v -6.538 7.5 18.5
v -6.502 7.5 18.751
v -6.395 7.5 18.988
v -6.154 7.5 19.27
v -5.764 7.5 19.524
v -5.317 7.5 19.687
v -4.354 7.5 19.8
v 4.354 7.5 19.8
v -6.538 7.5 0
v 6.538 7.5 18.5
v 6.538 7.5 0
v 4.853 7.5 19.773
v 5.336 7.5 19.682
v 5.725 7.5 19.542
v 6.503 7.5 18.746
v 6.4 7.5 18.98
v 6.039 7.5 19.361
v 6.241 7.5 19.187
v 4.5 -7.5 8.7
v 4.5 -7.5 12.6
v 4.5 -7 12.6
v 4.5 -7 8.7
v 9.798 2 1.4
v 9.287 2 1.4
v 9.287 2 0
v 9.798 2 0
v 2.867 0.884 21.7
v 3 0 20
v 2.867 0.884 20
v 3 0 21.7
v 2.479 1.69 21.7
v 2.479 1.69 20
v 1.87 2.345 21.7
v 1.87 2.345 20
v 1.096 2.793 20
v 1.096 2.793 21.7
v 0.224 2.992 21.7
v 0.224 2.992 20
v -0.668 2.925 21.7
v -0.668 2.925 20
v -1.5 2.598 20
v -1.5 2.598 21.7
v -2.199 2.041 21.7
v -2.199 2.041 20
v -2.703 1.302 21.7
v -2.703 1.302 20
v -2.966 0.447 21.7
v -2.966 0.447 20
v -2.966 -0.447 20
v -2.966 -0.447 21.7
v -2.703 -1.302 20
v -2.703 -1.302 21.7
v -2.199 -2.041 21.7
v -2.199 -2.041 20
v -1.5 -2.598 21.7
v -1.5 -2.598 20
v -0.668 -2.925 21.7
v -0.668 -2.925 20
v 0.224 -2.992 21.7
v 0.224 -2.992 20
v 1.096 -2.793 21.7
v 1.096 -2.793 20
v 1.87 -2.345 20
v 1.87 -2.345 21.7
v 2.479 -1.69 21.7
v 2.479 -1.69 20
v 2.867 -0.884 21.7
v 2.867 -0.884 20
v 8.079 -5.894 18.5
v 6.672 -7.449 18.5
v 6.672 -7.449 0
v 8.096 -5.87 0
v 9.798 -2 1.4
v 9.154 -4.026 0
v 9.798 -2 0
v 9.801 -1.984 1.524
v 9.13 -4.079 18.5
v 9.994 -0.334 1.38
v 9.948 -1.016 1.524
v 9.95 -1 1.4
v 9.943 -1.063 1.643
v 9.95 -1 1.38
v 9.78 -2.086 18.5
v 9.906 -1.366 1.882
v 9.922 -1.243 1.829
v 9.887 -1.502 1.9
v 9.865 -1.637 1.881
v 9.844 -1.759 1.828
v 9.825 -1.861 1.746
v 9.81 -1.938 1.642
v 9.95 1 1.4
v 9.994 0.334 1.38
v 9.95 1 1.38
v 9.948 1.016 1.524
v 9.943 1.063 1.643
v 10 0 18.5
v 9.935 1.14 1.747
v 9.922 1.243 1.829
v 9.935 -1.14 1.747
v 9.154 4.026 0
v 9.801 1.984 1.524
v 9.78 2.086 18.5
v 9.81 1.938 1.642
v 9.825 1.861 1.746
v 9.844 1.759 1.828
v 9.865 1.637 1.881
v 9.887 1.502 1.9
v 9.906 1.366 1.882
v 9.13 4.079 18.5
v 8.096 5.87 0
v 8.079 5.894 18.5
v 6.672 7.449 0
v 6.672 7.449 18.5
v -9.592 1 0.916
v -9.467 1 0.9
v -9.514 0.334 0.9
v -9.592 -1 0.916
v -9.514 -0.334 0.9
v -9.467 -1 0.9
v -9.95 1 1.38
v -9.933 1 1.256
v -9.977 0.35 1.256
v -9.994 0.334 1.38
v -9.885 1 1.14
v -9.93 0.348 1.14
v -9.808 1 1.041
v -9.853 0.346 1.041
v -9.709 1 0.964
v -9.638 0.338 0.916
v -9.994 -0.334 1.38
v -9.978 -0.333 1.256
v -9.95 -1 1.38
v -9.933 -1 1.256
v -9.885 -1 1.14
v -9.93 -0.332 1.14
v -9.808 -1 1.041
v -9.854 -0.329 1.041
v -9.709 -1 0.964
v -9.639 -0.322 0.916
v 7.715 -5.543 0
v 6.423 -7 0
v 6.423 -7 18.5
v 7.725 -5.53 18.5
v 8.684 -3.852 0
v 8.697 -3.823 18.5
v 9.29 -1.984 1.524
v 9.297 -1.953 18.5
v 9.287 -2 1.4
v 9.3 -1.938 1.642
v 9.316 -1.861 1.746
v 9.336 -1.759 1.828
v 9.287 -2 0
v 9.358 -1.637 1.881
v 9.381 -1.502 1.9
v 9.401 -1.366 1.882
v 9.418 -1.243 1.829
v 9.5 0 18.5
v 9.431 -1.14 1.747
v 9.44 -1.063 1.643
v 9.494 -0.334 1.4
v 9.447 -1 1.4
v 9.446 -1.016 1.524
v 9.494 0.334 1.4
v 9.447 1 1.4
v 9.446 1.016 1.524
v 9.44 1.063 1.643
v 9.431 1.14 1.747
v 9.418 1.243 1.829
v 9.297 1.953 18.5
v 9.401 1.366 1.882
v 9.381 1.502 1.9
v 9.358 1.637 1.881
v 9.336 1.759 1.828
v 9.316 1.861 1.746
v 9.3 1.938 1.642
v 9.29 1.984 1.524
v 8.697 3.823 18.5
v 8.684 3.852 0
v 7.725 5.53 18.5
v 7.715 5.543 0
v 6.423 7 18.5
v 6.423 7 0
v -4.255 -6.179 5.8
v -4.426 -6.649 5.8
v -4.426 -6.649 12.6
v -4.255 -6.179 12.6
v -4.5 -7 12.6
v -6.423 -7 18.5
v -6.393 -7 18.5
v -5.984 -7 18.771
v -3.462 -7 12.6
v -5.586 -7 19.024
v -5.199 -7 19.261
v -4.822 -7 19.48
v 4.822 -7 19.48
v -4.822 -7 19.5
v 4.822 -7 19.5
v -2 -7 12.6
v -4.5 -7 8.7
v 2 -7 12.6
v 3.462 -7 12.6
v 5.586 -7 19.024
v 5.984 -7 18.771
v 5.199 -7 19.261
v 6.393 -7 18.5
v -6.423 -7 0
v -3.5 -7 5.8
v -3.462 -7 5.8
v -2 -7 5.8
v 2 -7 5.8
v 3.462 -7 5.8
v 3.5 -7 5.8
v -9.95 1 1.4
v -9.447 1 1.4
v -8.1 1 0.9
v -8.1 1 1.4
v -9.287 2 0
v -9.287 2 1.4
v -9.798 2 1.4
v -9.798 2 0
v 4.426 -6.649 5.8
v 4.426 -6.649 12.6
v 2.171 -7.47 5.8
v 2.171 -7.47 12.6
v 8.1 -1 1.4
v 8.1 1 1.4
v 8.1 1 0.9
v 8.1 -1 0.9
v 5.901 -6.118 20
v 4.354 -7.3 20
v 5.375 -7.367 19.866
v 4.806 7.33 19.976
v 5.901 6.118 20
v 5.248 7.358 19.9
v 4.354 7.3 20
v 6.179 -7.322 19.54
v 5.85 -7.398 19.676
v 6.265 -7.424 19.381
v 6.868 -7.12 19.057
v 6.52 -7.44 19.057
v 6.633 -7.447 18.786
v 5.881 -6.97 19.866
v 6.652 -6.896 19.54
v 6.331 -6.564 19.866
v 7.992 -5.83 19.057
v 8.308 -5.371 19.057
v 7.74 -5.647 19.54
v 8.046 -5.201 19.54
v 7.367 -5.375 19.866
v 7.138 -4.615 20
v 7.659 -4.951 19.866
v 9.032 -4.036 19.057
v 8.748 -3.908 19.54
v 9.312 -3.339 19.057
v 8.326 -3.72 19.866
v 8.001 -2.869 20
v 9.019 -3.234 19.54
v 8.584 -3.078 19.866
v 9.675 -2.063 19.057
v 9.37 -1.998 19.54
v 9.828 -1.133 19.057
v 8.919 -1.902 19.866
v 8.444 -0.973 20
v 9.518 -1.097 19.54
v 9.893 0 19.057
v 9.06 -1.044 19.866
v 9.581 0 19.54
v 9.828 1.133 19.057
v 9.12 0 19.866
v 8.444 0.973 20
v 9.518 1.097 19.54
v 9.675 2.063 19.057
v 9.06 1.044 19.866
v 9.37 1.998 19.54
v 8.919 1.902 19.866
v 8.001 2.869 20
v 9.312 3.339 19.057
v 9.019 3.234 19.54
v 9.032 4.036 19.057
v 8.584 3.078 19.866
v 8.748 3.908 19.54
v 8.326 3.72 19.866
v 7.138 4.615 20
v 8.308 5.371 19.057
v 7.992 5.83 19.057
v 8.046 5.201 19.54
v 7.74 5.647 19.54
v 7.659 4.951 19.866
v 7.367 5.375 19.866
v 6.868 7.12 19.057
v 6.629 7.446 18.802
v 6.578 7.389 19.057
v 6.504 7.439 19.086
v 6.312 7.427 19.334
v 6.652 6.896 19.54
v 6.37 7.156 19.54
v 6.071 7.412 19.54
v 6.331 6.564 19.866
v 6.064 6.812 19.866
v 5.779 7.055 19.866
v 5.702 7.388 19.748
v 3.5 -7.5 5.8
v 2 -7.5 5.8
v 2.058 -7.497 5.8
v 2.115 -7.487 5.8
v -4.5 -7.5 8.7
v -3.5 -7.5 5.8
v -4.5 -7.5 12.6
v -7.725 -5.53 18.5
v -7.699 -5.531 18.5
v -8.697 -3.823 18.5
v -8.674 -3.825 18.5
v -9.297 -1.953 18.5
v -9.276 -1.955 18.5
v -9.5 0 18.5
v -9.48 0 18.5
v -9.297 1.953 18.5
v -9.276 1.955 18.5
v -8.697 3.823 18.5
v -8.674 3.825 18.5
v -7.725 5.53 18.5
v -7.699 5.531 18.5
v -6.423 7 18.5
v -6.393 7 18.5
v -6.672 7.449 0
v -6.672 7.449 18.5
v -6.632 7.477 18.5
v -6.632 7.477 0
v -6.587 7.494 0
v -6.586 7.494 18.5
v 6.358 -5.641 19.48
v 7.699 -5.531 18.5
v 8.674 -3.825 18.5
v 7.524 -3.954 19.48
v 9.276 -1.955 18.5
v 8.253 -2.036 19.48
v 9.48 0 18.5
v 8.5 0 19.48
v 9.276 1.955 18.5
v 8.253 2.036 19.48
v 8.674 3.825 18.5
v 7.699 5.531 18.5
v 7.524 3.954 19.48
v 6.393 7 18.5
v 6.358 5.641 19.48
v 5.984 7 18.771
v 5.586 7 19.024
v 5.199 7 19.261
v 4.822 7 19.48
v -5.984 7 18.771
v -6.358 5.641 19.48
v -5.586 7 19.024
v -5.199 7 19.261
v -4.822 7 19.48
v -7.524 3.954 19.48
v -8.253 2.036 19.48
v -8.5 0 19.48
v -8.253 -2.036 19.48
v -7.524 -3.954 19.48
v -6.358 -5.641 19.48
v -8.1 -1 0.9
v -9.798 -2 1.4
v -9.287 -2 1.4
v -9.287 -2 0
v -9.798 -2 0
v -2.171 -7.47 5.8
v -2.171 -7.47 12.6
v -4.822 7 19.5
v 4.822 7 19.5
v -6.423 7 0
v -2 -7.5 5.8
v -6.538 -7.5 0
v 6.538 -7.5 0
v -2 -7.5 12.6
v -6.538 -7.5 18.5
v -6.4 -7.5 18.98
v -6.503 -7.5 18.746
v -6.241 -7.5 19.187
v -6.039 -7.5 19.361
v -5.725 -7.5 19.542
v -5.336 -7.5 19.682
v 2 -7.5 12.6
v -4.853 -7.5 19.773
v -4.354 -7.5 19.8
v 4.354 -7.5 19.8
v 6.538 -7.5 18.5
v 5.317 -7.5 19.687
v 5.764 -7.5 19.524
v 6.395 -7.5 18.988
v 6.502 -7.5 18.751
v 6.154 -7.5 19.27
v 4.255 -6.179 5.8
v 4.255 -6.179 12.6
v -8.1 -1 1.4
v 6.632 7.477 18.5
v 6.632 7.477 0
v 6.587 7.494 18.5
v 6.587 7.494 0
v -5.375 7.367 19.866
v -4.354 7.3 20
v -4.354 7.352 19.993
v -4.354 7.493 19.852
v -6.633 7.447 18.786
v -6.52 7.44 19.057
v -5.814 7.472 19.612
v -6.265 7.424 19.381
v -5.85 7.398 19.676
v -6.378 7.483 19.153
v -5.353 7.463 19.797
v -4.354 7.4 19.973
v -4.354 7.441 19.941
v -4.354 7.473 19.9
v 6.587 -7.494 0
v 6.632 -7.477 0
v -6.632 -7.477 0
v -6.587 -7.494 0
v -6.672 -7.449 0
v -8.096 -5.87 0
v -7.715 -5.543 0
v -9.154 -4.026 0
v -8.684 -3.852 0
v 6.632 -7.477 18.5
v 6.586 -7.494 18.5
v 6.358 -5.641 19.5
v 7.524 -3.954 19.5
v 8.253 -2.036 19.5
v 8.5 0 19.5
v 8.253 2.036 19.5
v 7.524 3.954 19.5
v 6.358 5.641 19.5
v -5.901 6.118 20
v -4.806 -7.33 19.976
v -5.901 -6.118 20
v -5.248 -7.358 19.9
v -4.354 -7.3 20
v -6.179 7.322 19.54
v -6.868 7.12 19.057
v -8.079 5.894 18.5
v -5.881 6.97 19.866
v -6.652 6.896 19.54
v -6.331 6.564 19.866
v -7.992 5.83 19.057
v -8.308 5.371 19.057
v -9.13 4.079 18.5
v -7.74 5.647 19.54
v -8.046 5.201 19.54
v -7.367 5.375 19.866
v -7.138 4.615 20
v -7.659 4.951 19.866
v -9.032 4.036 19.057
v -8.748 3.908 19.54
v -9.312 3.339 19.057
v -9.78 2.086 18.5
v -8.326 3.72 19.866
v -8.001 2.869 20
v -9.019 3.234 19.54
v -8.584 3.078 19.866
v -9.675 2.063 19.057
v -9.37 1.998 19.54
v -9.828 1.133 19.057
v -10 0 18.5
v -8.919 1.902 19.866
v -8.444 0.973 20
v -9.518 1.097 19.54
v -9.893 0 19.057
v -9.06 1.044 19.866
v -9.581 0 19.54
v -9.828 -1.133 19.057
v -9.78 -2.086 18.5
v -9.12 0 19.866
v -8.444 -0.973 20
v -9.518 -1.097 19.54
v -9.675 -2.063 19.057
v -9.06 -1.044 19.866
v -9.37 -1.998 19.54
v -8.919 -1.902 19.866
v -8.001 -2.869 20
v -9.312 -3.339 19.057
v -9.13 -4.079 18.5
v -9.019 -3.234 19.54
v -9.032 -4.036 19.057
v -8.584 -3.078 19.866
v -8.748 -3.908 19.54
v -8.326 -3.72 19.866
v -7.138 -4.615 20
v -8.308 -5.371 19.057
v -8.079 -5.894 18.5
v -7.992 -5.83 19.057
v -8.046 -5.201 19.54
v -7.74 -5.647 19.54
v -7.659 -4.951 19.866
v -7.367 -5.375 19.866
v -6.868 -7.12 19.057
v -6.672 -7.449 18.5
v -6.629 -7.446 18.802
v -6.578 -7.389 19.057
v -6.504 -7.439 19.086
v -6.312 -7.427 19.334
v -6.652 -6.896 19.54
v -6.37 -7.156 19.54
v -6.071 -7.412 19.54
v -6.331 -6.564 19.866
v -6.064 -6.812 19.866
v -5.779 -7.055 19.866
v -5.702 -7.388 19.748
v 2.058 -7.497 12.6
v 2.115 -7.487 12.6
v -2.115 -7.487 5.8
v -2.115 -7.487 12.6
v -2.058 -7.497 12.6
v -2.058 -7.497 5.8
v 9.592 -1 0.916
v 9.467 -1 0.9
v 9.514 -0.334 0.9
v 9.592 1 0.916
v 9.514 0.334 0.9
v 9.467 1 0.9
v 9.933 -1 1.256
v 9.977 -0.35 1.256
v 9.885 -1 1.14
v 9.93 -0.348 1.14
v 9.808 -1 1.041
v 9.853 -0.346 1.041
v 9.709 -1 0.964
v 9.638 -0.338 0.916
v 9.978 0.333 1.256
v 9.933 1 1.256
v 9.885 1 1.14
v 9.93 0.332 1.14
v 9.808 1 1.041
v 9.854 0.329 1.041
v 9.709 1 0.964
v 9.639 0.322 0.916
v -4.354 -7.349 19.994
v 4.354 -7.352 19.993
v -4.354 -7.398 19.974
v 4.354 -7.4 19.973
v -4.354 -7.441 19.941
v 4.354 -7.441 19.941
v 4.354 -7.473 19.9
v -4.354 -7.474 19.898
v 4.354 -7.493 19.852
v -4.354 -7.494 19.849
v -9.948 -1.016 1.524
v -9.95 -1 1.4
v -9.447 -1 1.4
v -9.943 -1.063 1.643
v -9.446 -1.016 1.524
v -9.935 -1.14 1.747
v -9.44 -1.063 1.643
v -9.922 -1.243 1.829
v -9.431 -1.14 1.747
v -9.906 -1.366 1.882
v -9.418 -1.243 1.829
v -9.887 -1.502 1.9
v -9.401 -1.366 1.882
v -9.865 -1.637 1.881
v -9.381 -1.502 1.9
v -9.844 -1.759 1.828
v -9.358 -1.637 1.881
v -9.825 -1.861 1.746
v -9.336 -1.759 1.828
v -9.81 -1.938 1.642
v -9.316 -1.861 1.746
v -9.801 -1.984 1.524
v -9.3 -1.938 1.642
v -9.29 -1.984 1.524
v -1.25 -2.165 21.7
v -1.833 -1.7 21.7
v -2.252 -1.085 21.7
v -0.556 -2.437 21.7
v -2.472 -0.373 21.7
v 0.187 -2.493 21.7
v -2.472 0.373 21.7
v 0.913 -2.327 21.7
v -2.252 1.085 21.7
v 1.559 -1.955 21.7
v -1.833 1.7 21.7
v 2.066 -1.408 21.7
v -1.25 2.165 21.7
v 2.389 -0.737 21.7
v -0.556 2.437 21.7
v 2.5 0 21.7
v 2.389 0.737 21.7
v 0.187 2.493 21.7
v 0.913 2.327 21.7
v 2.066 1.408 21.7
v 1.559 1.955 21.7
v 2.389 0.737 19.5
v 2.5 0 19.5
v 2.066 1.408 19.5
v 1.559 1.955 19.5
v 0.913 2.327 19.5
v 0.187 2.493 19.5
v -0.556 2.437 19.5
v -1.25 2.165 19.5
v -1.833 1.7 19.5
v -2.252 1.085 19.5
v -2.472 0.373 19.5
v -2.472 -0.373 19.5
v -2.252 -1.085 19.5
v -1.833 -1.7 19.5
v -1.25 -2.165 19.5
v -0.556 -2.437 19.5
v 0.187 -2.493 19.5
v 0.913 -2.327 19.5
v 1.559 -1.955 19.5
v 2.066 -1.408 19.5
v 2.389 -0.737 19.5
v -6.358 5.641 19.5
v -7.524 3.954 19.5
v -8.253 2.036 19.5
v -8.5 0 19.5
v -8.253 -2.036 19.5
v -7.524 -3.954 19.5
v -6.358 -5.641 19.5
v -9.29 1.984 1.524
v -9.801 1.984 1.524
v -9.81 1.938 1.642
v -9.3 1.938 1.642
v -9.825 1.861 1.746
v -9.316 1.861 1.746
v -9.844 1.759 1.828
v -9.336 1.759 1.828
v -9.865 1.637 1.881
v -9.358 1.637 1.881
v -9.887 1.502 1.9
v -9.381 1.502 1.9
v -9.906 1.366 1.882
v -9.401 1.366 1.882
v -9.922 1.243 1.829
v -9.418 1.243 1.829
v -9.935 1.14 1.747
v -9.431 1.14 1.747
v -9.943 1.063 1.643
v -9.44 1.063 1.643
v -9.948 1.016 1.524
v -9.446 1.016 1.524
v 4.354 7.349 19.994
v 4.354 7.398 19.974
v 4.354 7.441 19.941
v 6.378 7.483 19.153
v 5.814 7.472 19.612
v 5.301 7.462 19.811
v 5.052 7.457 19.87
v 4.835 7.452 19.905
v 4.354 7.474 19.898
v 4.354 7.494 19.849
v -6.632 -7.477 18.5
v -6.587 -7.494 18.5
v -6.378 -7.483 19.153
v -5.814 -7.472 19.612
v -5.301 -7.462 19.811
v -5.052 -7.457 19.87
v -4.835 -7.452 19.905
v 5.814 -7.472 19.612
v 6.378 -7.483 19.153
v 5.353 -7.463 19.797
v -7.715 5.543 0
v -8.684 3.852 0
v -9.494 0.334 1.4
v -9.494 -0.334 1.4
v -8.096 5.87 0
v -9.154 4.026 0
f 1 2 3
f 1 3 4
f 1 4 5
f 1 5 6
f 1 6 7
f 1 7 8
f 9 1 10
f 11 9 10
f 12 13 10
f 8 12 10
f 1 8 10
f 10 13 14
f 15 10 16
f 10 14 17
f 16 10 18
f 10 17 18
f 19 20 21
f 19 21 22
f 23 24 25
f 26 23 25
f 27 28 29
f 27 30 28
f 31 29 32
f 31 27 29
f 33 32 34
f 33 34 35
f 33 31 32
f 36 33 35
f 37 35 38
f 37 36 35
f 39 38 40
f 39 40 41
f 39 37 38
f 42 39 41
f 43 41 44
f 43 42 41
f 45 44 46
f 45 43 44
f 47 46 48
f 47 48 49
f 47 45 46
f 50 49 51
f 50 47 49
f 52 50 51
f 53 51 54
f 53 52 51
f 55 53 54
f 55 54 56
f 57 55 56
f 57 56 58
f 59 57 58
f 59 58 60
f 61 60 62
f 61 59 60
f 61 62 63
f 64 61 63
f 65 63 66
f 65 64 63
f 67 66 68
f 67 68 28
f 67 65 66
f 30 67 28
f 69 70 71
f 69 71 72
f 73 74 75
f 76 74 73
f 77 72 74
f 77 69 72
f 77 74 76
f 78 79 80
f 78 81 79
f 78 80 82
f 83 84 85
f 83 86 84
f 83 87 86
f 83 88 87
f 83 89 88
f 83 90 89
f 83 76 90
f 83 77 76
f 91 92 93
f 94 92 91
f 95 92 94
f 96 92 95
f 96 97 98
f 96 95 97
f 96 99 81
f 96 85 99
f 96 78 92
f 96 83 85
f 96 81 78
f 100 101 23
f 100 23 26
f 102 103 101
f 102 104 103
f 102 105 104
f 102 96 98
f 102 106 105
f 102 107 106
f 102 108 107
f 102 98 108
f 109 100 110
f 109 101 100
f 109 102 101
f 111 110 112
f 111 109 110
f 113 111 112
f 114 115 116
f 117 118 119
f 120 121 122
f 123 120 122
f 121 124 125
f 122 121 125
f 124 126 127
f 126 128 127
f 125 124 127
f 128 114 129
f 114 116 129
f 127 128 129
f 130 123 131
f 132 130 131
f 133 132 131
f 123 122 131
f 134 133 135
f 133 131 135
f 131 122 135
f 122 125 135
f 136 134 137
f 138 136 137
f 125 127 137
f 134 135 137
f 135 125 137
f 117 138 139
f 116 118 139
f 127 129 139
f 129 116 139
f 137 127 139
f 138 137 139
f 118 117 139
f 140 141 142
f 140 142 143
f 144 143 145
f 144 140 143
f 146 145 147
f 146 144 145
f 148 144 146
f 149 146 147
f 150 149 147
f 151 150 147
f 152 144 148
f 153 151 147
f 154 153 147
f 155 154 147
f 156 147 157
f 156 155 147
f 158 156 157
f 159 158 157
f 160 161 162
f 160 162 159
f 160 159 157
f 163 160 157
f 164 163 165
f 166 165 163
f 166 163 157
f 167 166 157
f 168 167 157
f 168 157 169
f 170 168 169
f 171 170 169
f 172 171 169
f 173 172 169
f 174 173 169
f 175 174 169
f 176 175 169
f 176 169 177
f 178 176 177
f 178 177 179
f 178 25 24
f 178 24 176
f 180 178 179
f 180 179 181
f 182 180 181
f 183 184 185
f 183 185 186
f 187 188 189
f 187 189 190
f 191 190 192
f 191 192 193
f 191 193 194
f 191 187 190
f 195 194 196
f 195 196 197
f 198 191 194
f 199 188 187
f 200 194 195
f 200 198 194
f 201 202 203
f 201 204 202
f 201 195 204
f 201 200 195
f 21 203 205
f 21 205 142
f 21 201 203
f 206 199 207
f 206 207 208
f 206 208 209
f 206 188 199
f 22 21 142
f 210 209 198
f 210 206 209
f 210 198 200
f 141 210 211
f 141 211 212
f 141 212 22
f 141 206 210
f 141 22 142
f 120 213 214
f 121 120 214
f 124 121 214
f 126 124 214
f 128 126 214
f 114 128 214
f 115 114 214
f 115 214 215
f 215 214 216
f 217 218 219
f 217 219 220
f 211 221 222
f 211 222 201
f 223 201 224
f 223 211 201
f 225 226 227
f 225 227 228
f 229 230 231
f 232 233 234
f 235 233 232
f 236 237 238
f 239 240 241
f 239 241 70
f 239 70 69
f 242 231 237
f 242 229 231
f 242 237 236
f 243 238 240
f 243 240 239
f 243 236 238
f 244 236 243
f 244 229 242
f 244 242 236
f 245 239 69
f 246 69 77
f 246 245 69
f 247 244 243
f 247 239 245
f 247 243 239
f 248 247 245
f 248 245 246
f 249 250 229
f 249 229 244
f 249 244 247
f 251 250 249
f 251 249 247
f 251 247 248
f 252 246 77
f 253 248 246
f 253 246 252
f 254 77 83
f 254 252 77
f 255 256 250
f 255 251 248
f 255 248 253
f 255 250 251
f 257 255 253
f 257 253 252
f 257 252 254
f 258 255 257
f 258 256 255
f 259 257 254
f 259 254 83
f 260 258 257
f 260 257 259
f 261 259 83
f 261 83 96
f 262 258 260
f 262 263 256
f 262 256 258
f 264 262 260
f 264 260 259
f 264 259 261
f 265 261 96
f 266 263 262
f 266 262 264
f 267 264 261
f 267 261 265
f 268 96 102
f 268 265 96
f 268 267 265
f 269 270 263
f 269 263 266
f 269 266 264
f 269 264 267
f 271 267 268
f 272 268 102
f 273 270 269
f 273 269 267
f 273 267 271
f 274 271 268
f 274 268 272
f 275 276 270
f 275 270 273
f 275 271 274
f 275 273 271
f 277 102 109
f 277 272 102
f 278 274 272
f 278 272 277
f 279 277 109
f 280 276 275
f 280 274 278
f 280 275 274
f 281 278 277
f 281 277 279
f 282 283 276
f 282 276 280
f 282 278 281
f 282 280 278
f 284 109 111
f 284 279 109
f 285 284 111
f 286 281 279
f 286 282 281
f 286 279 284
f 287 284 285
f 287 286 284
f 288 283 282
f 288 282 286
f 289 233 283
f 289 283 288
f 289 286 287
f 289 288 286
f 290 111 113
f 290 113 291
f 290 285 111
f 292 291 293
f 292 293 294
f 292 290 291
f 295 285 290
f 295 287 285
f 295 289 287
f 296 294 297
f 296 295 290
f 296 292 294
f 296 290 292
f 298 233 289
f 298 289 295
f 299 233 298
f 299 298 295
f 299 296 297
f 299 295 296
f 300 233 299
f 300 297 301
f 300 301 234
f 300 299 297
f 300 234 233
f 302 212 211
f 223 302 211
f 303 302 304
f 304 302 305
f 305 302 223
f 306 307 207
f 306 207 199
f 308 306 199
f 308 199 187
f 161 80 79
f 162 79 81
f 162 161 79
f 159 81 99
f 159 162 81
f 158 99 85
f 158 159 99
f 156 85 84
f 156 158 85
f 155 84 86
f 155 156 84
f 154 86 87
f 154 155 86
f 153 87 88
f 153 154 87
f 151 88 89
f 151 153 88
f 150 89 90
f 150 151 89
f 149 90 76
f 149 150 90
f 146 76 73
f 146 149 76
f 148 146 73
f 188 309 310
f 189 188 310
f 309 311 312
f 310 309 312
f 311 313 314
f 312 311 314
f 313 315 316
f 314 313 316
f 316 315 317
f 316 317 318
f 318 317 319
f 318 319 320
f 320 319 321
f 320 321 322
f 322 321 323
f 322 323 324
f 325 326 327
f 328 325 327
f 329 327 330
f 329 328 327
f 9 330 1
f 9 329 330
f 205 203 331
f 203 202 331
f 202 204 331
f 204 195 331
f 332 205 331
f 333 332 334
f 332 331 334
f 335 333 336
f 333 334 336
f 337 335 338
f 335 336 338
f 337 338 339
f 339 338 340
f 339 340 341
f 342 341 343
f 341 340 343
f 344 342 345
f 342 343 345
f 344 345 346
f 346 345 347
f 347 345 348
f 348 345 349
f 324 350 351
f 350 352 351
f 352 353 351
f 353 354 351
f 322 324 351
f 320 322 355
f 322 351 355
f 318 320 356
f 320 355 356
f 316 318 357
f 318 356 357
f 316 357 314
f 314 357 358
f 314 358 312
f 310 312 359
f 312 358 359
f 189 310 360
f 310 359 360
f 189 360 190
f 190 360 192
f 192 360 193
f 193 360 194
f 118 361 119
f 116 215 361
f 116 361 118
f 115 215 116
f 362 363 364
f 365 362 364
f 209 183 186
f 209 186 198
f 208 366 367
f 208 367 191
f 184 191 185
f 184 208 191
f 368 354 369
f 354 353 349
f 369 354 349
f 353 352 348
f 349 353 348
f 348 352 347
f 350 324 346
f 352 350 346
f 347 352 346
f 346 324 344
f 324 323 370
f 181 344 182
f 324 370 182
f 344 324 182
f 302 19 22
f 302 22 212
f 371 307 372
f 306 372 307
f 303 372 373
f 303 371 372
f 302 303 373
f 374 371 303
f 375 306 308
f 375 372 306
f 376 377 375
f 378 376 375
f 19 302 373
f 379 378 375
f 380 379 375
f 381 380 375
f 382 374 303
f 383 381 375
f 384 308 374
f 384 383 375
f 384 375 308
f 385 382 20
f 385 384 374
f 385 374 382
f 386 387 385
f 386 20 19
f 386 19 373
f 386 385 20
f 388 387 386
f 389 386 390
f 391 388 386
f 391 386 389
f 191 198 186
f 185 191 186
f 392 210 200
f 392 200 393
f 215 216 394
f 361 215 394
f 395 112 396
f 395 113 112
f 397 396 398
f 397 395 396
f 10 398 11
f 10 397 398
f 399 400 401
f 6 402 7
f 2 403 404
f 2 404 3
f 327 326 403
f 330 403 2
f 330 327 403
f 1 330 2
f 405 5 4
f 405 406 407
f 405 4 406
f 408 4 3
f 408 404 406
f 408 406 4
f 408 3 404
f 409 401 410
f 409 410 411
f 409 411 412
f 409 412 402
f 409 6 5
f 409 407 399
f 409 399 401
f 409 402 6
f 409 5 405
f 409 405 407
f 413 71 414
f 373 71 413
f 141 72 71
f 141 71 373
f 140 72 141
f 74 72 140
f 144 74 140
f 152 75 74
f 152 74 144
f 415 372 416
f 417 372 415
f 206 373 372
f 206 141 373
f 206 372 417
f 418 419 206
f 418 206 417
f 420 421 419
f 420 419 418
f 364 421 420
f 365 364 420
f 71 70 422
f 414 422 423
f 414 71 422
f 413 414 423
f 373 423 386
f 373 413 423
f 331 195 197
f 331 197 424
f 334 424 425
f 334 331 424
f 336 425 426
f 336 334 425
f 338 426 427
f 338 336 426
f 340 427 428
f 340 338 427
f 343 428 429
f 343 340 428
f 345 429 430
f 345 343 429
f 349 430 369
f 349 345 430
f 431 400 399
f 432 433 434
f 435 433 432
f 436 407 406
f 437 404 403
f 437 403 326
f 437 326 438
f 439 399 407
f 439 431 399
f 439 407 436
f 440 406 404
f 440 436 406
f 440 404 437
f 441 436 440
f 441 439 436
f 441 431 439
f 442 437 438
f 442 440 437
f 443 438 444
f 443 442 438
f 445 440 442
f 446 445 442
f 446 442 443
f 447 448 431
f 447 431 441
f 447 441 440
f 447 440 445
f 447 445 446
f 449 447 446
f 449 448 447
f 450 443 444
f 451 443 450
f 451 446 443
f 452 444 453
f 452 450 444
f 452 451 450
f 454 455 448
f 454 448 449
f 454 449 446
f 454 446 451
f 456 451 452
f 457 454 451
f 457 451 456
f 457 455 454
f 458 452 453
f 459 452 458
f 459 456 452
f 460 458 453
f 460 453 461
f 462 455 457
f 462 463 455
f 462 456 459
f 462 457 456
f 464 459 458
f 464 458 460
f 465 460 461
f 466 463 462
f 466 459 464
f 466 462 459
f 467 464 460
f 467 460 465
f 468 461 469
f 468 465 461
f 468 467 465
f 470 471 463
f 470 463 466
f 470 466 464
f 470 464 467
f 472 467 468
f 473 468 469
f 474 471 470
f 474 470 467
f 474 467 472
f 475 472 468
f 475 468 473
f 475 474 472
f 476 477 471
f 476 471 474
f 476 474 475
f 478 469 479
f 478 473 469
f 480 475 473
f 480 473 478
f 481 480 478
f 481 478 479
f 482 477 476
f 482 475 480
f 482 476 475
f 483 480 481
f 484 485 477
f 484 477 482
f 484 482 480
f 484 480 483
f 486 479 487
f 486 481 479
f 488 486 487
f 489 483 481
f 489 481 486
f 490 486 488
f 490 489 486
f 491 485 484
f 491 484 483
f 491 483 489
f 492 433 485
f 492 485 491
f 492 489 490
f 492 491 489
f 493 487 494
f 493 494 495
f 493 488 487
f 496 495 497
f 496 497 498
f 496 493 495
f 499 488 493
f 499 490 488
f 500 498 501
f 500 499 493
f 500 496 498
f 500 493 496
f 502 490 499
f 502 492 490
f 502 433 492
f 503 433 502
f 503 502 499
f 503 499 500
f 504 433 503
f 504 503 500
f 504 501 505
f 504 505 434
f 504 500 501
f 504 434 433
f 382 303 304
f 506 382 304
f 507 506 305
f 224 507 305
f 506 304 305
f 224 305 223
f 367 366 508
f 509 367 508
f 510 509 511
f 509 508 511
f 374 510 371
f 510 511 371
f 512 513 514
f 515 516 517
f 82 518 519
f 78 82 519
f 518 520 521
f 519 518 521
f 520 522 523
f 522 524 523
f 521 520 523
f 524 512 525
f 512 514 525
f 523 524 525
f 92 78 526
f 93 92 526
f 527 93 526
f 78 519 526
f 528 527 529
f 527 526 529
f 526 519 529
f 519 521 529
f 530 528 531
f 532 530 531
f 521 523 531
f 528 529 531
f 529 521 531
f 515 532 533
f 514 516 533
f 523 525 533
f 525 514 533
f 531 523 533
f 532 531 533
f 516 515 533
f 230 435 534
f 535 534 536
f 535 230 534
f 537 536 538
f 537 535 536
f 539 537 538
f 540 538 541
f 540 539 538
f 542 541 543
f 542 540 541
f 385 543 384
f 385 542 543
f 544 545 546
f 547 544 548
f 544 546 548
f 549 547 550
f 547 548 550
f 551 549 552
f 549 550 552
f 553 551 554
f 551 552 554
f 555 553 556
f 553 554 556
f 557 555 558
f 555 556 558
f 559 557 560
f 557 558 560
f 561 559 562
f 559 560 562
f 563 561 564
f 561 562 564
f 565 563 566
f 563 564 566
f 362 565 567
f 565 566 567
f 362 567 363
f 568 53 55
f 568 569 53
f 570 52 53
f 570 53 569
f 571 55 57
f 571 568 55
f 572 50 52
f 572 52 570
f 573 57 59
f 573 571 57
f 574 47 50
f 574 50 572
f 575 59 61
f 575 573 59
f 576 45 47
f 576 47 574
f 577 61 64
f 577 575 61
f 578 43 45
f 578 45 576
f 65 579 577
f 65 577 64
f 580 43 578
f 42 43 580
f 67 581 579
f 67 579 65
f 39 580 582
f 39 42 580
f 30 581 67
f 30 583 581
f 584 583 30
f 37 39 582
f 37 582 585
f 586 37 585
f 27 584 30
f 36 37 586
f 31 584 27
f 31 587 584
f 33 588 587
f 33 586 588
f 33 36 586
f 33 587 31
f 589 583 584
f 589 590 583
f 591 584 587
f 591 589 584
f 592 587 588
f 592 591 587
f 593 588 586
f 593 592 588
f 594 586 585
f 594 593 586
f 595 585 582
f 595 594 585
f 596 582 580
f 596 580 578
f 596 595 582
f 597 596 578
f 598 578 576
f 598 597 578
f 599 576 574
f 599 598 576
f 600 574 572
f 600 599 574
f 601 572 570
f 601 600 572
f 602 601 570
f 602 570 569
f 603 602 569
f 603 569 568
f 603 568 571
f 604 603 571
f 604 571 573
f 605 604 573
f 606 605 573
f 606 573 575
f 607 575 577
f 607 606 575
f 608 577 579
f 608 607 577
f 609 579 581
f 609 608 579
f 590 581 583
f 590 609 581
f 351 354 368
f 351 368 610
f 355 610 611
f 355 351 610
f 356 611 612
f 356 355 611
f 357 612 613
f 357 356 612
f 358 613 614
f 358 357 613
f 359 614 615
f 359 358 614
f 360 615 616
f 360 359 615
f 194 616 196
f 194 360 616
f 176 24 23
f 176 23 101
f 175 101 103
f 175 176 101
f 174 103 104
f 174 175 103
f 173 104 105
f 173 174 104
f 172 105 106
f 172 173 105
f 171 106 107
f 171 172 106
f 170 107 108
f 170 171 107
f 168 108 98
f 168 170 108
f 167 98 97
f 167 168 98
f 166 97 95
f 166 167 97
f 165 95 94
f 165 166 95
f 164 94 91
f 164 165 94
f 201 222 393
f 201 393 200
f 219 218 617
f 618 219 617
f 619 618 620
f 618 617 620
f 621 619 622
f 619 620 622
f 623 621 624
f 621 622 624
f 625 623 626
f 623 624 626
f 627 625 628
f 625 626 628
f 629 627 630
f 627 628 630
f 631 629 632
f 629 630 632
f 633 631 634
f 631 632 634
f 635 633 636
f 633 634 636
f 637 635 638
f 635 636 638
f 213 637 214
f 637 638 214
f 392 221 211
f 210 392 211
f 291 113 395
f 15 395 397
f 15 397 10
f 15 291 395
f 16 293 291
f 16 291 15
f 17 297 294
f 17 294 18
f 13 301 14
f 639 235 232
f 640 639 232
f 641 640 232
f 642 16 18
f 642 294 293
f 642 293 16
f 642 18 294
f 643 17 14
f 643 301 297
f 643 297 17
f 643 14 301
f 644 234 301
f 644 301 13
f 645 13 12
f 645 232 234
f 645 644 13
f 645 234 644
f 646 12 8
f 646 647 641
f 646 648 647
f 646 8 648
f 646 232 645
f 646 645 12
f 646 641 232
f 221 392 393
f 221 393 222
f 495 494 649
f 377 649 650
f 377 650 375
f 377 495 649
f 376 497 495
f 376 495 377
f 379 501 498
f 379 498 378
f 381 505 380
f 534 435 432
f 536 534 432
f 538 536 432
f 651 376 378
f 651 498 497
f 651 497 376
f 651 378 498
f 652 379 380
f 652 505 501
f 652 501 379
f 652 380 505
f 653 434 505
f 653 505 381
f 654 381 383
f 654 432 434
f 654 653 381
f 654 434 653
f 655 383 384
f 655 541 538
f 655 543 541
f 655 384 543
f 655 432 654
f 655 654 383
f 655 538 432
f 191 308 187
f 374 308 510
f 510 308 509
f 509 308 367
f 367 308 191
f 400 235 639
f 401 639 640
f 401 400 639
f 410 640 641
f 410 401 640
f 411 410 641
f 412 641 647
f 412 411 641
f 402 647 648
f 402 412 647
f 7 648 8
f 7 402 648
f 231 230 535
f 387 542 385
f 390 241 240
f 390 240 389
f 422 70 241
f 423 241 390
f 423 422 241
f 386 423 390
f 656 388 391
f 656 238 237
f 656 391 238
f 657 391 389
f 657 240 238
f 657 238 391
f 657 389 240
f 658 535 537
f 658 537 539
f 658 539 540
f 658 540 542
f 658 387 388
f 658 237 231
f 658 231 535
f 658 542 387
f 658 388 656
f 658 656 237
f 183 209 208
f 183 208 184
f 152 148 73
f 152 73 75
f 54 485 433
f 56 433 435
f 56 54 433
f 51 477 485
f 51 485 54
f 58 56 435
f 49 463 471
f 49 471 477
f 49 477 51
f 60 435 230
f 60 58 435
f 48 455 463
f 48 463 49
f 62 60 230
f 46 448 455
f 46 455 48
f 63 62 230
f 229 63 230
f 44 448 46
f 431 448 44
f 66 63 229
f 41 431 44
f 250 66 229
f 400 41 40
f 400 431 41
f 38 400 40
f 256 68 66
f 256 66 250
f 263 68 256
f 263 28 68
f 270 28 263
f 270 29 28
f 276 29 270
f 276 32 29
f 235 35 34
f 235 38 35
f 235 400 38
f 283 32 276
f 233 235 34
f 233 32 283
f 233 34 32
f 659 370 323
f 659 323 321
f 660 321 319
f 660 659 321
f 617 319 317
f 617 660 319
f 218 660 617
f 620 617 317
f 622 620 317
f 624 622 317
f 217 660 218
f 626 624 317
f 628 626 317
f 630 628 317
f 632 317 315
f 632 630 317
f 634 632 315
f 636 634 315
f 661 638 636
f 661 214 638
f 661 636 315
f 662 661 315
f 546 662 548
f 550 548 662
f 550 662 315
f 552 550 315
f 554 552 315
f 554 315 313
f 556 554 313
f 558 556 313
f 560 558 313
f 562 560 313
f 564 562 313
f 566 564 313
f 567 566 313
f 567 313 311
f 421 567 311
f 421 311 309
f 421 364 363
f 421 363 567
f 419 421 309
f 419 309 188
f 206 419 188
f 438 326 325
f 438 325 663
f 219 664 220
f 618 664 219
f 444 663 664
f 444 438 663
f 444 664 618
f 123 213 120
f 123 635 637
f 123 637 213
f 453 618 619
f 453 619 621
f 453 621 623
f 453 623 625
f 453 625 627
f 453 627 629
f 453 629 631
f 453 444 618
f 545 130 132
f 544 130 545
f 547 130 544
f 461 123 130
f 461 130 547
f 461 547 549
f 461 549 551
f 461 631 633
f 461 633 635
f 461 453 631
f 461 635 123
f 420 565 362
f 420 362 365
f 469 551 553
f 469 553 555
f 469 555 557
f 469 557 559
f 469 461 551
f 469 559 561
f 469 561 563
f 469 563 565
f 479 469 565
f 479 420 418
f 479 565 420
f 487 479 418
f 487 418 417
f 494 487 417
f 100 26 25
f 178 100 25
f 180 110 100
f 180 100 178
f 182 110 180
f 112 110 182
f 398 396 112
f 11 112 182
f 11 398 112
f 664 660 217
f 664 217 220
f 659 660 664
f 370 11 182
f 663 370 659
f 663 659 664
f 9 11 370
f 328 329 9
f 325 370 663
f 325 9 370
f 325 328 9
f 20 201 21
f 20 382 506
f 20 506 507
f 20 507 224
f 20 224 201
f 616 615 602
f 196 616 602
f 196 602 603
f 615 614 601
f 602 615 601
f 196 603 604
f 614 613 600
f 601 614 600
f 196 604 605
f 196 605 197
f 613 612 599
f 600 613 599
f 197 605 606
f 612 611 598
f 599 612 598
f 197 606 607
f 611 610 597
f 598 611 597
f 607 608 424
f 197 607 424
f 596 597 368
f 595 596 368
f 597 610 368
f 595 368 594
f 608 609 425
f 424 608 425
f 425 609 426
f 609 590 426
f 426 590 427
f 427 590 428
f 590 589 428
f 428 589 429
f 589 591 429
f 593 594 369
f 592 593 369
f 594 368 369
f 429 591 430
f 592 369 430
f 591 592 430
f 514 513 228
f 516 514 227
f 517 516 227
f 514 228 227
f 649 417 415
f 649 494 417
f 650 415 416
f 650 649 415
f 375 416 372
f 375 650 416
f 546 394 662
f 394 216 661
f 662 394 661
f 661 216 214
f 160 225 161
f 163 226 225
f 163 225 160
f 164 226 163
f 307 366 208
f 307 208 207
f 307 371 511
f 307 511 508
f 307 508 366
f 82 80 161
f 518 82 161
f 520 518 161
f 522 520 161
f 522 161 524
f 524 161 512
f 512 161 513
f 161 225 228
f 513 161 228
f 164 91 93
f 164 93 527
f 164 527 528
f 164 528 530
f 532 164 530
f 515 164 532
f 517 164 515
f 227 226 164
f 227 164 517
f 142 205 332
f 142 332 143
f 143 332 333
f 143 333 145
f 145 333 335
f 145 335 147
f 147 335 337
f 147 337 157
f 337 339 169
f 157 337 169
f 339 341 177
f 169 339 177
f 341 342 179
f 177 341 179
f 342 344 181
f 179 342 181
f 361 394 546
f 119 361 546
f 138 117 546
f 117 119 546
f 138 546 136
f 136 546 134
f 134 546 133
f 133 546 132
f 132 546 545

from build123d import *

# Parameters (mm, degrees)
SKETCH001_W          = 24
SKETCH001_H          = 24
SKETCH001_W_2        = 22
SKETCH001_H_2        = 15
POCKET_DEPTH         = 20.001
POCKET001_DEPTH      = 18.5
POCKET011_DEPTH      = 1
CHAMFER_SIZE         = 0.98
POCKET009_DEPTH      = 10.001
POCKET009_DEPTH_BACK = 10.001
PAD_DEPTH            = 0.5
POCKET010_DEPTH      = 0.6
PAD001_DEPTH         = 6.8
FILLET001_R          = 0.2
FILLET002_R          = 0.48


with BuildPart() as part:
    # Sketch → Revolution (revolve)
    with BuildSketch(Plane.XZ):
        with BuildLine():
            Line((2.5, 0), (10, 0))
            Line((10, 0), (10, 18.5))
            ThreePointArc((10, 18.5), (9.56066, 19.56066), (8.5, 20))
            Line((8.5, 20), (3, 20))
            Line((3, 20), (3, 21.7))
            Line((3, 21.7), (2.5, 21.7))
            Line((2.5, 21.7), (2.5, 0))
        make_face()
    revolve(axis=Axis((0, 0, 0), (0, 0, 1)))

    # Sketch001 → Pocket (cut, through all)
    with BuildSketch(Plane.XY.offset(20)):
        Rectangle(SKETCH001_W, SKETCH001_H)
        Rectangle(SKETCH001_W_2, SKETCH001_H_2, mode=Mode.SUBTRACT)
    extrude(amount=-POCKET_DEPTH, mode=Mode.SUBTRACT)

    # Sketch002 → Pocket001 (cut)
    with BuildSketch(Plane.XY):
        with BuildLine():
            ThreePointArc((-6.422616, 7), (-9.5, 0), (-6.422616, -7))
            Line((-6.422616, -7), (6.422616, -7))
            ThreePointArc((6.422616, -7), (9.5, 0), (6.422616, 7))
            Line((-6.422616, 7), (6.422616, 7))
        make_face()
    extrude(amount=POCKET001_DEPTH, mode=Mode.SUBTRACT)

    # Sketch016 → Pocket011 (cut)
    with BuildSketch(Plane.XY.offset(18.5)):
        with BuildLine():
            ThreePointArc((-4.821825, 7), (-8.5, 0), (-4.821825, -7))
            Line((-4.821825, -7), (4.821825, -7))
            ThreePointArc((4.821825, -7), (8.5, 0), (4.821825, 7))
            Line((-4.821825, 7), (4.821825, 7))
        make_face()
    extrude(amount=POCKET011_DEPTH, mode=Mode.SUBTRACT)

    # Chamfer
    chamfer_edges = [part.edges().sort_by_distance(p)[0] for p in [
        (8.5, 0, 18.5),
        (-8.5, 0, 18.5),
    ]]
    chamfer(chamfer_edges, length=CHAMFER_SIZE)

    # Sketch011 → Pocket009 (cut, two sides)
    with BuildSketch(Plane.YZ) as pocket009_sk:
        with BuildLine():
            ThreePointArc((-1, 1.4), (-1.5, 1.9), (-2, 1.4))
            Line((-2, 1.4), (-2, -0.5))
            Line((-2, -0.5), (2, -0.5))
            Line((2, 1.4), (2, -0.5))
            ThreePointArc((2, 1.4), (1.5, 1.9), (1, 1.4))
            Line((1, 1.4), (1, 0.9))
            Line((-1, 0.9), (1, 0.9))
            Line((-1, 1.4), (-1, 0.9))
        make_face()
    extrude(amount=-POCKET009_DEPTH, mode=Mode.SUBTRACT)
    extrude(pocket009_sk.sketch, amount=POCKET009_DEPTH_BACK, mode=Mode.SUBTRACT)

    # Sketch012 → Pad (join)
    with BuildSketch(Plane(origin=(0, 0, 1.4), x_dir=(-1, 0, 0), z_dir=(0, 0, -1))):
        with BuildLine():
            Line((9.447222, 1), (8.1, 1))
            Line((8.1, 1), (8.1, -1))
            Line((8.1, -1), (9.447222, -1))
            ThreePointArc((9.447222, -1), (9.5, 0), (9.447222, 1))
        make_face()
        with BuildLine():
            Line((-9.447222, 1), (-8.1, 1))
            Line((-8.1, 1), (-8.1, -1))
            Line((-8.1, -1), (-9.447222, -1))
            ThreePointArc((-9.447222, 1), (-9.5, 0), (-9.447222, -1))
        make_face()
    extrude(amount=PAD_DEPTH)

    # Sketch013 → Pocket010 (cut)
    with BuildSketch(Plane.XZ.offset(7.5)):
        Polygon((2, 12.6), (4.5, 12.6), (4.5, 8.7), (3.5, 5.8), (2, 5.8), align=None)
        Polygon((-4.5, 12.6), (-2, 12.6), (-2, 5.8), (-3.5, 5.8), (-4.5, 8.7), align=None)
    extrude(amount=-POCKET010_DEPTH, mode=Mode.SUBTRACT)

    # Sketch014 → Pad001 (join)
    with BuildSketch(Plane.XY.offset(5.8)):
        with BuildLine():
            Line((2, -7), (4.255262, -6.179152))
            Line((4.255262, -6.179152), (4.426272, -6.648998))
            Line((4.426272, -6.648998), (2.17101, -7.469846))
            ThreePointArc((2, -7.5), (2.086824, -7.492404), (2.17101, -7.469846))
            Line((2, -7), (2, -7.5))
        make_face()
        with BuildLine():
            Line((-2, -7), (-2, -7.5))
            ThreePointArc((-2.17101, -7.469846), (-2.086824, -7.492404), (-2, -7.5))
            Line((-2.17101, -7.469846), (-4.426272, -6.648998))
            Line((-4.426272, -6.648998), (-4.255262, -6.179152))
            Line((-4.255262, -6.179152), (-2, -7))
        make_face()
    extrude(amount=PAD001_DEPTH)

    # Fillet001
    fillet001_edges = [part.edges().sort_by_distance(p)[0] for p in [
        (-6.614378, -7.5, 9.25),
        (-5.626056, -7.5, 19.717894),
        (0, -7.5, 20),
        (5.626056, -7.5, 19.717894),
        (6.614378, -7.5, 9.25),
        (6.614378, 7.5, 9.25),
        (5.626056, 7.5, 19.717894),
        (0, 7.5, 20),
        (-5.626056, 7.5, 19.717894),
        (-6.614378, 7.5, 9.25),
    ]]
    fillet(fillet001_edges, radius=FILLET001_R)

    # Fillet002
    fillet002_edges = [part.edges().sort_by_distance(p)[0] for p in [
        (-10, 0, 0.9),
        (9.987461, 0.500628, 0.9),
        (9.987461, -0.500628, 0.9),
    ]]
    fillet(fillet002_edges, radius=FILLET002_R)


solid = part.part
